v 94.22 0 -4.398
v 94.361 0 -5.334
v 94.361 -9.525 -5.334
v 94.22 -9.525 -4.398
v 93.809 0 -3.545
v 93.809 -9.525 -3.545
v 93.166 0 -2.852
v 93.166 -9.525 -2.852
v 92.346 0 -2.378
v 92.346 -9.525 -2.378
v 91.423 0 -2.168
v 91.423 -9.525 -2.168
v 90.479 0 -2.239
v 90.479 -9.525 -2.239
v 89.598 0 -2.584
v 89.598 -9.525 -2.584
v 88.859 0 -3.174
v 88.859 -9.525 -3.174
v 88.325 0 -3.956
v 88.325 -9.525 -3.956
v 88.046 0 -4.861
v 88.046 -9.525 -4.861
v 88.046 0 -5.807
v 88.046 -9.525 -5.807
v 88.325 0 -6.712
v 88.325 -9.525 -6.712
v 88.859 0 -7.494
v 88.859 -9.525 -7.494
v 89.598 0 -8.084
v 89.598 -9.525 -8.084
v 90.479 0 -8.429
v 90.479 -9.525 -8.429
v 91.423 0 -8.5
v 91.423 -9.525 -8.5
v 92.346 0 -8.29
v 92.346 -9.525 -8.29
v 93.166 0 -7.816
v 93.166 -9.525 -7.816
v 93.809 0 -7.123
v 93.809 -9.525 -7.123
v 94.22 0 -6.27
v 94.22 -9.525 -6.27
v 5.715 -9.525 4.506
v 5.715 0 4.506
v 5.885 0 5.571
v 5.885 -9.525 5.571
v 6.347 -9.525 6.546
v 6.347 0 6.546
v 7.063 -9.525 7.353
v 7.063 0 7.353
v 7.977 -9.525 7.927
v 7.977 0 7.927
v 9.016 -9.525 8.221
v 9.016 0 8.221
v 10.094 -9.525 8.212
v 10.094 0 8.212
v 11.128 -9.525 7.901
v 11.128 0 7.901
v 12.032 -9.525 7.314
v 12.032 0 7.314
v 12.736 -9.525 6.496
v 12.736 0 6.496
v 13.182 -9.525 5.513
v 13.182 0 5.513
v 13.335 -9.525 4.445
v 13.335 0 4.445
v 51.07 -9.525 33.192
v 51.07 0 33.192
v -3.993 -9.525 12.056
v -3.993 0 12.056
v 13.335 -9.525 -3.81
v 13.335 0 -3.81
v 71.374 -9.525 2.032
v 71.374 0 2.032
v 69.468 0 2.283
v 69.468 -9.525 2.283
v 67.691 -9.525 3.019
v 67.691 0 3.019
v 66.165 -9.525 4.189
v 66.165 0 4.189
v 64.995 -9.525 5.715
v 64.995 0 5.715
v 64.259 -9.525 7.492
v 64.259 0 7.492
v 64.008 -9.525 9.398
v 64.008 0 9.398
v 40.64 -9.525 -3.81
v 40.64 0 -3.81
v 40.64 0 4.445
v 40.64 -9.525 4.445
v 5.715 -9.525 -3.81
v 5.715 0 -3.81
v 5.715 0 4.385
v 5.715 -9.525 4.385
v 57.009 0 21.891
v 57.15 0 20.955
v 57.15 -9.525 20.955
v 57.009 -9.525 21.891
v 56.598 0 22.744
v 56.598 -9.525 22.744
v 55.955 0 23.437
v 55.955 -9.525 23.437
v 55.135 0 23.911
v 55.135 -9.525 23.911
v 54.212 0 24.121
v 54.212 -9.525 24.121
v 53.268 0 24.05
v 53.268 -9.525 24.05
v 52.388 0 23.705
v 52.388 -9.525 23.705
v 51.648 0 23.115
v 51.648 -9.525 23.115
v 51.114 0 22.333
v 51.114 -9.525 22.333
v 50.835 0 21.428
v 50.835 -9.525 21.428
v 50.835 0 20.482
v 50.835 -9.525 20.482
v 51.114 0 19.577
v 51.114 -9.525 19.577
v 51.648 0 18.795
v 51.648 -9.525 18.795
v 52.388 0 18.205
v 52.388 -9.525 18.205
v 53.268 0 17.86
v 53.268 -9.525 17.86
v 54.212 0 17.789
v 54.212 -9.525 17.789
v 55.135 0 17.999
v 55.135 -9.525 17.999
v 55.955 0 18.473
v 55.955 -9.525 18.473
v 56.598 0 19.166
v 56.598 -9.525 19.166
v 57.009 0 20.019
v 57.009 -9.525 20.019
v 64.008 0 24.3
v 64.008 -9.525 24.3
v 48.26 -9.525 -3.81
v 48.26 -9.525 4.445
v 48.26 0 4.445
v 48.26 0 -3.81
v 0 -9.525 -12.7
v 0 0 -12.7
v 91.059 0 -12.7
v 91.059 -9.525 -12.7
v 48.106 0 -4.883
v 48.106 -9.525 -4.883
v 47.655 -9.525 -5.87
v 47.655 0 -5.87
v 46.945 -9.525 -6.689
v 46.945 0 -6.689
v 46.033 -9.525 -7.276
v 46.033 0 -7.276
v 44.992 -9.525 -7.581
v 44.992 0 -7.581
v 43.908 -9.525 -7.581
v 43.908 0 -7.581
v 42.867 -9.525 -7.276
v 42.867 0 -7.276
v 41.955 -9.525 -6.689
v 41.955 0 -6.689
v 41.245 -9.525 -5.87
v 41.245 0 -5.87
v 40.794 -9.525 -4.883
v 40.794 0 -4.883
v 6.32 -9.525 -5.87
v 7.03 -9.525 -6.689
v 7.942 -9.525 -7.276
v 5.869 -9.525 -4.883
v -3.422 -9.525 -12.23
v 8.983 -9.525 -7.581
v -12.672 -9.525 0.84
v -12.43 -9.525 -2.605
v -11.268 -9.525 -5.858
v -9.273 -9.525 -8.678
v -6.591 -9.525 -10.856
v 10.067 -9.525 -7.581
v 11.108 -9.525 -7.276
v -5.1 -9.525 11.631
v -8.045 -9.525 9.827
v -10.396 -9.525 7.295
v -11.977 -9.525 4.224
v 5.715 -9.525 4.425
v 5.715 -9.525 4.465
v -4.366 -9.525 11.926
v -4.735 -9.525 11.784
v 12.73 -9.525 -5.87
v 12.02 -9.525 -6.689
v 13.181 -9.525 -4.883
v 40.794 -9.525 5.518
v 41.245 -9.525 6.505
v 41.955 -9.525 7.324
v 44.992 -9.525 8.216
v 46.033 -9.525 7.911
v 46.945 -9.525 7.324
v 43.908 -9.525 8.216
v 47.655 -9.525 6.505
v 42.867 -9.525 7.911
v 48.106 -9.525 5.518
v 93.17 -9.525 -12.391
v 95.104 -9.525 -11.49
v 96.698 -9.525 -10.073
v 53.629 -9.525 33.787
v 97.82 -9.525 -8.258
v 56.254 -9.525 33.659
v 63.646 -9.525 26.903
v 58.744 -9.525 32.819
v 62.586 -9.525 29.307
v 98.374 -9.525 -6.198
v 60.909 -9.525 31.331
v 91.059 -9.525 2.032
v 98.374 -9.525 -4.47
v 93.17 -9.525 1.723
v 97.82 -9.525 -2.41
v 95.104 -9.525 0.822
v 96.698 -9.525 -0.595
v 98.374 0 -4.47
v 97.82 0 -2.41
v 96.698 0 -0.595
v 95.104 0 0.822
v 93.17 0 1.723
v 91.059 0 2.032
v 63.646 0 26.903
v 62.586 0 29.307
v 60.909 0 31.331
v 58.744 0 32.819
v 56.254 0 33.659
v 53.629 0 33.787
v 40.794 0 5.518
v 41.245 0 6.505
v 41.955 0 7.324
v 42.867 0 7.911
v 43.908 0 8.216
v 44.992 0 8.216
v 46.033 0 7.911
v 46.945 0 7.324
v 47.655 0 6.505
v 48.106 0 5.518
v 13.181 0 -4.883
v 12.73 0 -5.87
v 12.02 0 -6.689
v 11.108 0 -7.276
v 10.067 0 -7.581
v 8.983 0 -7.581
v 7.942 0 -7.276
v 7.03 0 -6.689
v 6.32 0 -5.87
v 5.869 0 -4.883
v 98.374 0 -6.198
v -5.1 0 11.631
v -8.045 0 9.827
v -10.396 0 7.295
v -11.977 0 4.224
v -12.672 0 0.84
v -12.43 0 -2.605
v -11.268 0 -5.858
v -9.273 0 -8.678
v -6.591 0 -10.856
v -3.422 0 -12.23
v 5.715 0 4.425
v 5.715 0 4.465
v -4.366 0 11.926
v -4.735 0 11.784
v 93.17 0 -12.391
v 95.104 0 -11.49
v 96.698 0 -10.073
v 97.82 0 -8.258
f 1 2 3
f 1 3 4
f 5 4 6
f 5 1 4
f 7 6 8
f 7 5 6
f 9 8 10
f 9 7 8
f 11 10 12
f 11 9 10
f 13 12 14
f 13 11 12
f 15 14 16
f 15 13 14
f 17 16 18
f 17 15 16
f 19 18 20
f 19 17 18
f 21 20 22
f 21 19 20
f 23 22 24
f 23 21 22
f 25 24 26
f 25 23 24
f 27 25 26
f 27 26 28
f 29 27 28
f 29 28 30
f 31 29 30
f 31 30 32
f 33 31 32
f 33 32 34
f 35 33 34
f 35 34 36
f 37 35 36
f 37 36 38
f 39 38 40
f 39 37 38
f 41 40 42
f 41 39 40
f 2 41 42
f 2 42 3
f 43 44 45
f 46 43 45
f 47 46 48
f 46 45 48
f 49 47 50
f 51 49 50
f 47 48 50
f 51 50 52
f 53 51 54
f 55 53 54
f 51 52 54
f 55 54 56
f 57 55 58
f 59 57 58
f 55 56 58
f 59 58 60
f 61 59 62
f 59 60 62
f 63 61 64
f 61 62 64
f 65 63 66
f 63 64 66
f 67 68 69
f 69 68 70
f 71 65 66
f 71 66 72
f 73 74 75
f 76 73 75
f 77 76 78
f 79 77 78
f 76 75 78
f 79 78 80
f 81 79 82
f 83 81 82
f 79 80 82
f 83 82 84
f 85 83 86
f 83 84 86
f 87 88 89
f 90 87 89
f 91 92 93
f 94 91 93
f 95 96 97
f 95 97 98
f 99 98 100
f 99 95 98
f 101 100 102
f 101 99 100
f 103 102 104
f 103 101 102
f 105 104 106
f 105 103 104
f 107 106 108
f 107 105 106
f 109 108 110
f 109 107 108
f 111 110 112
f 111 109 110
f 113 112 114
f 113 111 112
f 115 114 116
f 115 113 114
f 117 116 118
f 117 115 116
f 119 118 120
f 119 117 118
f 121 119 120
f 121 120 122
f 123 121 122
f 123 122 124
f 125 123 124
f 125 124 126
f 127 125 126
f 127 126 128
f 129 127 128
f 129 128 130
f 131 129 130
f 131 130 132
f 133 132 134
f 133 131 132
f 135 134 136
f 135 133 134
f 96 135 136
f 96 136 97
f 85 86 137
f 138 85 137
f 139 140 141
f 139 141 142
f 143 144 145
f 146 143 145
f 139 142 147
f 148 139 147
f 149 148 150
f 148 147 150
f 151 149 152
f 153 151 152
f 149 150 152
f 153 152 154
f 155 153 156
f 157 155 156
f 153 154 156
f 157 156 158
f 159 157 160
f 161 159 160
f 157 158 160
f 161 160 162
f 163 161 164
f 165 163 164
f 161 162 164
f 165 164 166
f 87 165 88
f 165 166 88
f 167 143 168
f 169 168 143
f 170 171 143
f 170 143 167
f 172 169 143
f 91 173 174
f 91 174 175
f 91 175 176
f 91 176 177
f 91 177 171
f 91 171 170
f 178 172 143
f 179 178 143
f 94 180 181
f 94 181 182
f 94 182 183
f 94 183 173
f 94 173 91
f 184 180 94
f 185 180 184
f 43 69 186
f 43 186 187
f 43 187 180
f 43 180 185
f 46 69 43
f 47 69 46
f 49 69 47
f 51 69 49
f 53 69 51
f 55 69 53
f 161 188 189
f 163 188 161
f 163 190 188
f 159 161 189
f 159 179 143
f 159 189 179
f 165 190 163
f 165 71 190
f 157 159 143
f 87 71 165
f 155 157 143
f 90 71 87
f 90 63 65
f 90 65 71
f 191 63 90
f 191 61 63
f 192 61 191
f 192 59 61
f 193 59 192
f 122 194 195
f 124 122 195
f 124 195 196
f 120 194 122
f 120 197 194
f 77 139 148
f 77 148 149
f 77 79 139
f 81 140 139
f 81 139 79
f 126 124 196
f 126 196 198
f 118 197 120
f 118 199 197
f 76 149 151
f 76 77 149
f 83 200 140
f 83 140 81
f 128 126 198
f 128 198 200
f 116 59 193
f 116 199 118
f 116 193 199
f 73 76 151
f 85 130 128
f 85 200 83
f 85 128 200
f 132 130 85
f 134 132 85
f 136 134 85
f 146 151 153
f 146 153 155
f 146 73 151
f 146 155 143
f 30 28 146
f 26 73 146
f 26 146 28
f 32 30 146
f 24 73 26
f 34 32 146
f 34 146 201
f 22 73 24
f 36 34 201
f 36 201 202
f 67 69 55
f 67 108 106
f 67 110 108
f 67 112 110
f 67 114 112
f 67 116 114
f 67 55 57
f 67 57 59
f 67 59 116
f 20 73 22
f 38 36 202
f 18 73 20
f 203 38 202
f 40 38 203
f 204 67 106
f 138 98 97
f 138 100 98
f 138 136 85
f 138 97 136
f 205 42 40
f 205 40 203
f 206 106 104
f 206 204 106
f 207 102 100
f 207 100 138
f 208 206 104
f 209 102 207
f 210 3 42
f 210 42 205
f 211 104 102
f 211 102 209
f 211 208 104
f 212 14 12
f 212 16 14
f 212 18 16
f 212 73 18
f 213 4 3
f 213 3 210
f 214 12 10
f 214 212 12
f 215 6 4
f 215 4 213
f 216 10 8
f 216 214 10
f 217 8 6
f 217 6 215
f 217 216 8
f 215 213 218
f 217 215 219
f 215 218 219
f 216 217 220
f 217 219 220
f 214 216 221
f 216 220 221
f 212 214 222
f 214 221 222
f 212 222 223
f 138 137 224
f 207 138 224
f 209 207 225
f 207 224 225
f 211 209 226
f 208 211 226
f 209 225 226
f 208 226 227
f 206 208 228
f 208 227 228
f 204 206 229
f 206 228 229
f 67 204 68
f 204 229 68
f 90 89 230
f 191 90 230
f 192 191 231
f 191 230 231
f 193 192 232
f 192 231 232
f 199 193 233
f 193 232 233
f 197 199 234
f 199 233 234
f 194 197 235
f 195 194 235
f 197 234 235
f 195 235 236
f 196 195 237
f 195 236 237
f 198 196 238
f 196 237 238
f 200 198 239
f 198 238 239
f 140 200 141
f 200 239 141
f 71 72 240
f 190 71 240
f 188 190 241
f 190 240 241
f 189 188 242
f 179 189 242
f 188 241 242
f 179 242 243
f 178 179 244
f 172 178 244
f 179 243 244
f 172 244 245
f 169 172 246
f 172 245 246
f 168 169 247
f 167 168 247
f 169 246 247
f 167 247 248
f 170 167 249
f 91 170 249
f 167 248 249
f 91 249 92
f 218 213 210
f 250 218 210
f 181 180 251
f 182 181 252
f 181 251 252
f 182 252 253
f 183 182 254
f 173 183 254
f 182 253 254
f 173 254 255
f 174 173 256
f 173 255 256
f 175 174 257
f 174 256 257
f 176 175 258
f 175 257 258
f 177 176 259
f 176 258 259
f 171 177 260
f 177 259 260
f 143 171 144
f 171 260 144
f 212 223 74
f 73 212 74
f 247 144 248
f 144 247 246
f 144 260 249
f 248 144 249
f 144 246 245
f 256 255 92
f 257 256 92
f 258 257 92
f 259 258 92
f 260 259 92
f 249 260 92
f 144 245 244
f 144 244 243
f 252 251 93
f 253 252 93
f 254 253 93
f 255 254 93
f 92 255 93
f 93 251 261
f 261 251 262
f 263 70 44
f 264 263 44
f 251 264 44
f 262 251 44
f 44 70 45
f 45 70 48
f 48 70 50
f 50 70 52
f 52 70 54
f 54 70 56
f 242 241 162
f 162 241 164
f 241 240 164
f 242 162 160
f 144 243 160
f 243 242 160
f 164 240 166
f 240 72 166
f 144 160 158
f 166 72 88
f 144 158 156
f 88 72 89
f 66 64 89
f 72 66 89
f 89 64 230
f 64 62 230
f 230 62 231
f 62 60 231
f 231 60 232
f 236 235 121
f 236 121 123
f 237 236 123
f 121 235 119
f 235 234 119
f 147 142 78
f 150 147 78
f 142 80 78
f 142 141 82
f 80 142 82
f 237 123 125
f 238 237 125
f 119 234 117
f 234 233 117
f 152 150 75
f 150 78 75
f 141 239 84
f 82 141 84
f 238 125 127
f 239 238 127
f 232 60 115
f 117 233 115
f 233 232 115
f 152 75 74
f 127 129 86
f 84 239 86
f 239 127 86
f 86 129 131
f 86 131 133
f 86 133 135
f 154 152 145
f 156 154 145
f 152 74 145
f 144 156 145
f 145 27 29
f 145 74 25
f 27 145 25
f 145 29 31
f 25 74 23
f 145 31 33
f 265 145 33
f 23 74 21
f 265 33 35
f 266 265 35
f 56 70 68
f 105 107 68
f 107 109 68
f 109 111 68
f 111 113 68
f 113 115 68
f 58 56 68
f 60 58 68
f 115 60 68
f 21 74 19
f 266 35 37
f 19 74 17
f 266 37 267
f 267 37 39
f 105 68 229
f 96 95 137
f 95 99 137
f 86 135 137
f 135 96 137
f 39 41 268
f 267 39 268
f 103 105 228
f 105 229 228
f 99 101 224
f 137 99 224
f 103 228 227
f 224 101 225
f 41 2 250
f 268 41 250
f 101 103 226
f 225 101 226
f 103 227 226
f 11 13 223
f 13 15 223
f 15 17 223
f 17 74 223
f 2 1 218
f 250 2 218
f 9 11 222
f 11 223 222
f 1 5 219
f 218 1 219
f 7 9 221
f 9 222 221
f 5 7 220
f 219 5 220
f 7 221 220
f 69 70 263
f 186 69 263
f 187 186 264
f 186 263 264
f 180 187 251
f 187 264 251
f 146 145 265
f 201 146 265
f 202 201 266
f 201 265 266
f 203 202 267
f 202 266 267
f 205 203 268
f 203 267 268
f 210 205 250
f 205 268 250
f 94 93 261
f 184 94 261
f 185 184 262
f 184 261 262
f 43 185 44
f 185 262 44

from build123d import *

# Parameters (mm, degrees)
F0_R     = 3.175
F1_DEPTH = 9.525
F3_DEPTH = 127


with BuildPart() as f1:
    # F0 (on Front) → F1 (new body)
    with BuildSketch(Plane.XZ):
        with BuildLine():
            Line((-5.09987, 11.63105), (-3.99275, 12.056034))
            ThreePointArc((-3.99275, 12.056034), (-4.551273, 11.856471), (-5.09987, 11.63105))
        make_face()
        with BuildLine():
            Line((51.069545, 33.192469), (-3.99275, 12.056034))
            Line((-3.99275, 12.056034), (-5.09987, 11.63105))
            ThreePointArc((-5.09987, 11.63105), (-12.42989, -2.605347), (0, -12.7))
            Line((0, -12.7), (91.059, -12.7))
            ThreePointArc((91.059, -12.7), (98.425, -5.334), (91.059, 2.032))
            Line((91.059, 2.032), (71.374, 2.032))
            ThreePointArc((71.374, 2.032), (66.165451, 4.189451), (64.008, 9.398))
            Line((64.008, 9.398), (64.008, 24.300115))
            ThreePointArc((64.008, 24.300115), (59.878019, 32.149917), (51.069545, 33.192469))
        make_face()
        with BuildLine():
            ThreePointArc((5.715483, 4.505655), (9.555328, 8.254879), (13.335, 4.445))
            Line((13.335, 4.445), (13.335, -3.81))
            ThreePointArc((13.335, -3.81), (9.524889, -7.62), (5.715, -3.809779))
            Line((5.715, -3.809779), (5.715476, 4.384788))
            ThreePointArc((5.715476, 4.384788), (5.715, 4.445221), (5.715483, 4.505655))
        make_face(mode=Mode.SUBTRACT)
        with Locations((91.186, -5.334)):
            Circle(F0_R, mode=Mode.SUBTRACT)
        with BuildLine():
            ThreePointArc((40.64, 4.445), (44.45, 8.255), (48.26, 4.445))
            Line((48.26, 4.445), (48.26, -3.81))
            ThreePointArc((48.26, -3.81), (44.45, -7.62), (40.64, -3.81))
            Line((40.64, -3.81), (40.64, 4.445))
        make_face(mode=Mode.SUBTRACT)
        with Locations((53.975, 20.955)):
            Circle(F0_R, mode=Mode.SUBTRACT)
    extrude(amount=F1_DEPTH)

    # F2 (on face) → F3 (cut)
    with BuildSketch(Plane.XZ.offset(9.525)):
        with BuildLine():
            ThreePointArc((98.3742, -6.1976), (98.412289, -5.766546), (98.425, -5.334))
            Line((98.425, -5.334), (98.3742, -5.334))
            Line((98.3742, -5.334), (98.3742, -6.1976))
        make_face()
        with BuildLine():
            Line((98.3742, -5.334), (98.425, -5.334))
            ThreePointArc((98.425, -5.334), (98.412289, -4.901454), (98.3742, -4.4704))
            Line((98.3742, -4.4704), (98.3742, -5.334))
        make_face()
    extrude(amount=-F3_DEPTH, mode=Mode.SUBTRACT)


solid = f1.part
